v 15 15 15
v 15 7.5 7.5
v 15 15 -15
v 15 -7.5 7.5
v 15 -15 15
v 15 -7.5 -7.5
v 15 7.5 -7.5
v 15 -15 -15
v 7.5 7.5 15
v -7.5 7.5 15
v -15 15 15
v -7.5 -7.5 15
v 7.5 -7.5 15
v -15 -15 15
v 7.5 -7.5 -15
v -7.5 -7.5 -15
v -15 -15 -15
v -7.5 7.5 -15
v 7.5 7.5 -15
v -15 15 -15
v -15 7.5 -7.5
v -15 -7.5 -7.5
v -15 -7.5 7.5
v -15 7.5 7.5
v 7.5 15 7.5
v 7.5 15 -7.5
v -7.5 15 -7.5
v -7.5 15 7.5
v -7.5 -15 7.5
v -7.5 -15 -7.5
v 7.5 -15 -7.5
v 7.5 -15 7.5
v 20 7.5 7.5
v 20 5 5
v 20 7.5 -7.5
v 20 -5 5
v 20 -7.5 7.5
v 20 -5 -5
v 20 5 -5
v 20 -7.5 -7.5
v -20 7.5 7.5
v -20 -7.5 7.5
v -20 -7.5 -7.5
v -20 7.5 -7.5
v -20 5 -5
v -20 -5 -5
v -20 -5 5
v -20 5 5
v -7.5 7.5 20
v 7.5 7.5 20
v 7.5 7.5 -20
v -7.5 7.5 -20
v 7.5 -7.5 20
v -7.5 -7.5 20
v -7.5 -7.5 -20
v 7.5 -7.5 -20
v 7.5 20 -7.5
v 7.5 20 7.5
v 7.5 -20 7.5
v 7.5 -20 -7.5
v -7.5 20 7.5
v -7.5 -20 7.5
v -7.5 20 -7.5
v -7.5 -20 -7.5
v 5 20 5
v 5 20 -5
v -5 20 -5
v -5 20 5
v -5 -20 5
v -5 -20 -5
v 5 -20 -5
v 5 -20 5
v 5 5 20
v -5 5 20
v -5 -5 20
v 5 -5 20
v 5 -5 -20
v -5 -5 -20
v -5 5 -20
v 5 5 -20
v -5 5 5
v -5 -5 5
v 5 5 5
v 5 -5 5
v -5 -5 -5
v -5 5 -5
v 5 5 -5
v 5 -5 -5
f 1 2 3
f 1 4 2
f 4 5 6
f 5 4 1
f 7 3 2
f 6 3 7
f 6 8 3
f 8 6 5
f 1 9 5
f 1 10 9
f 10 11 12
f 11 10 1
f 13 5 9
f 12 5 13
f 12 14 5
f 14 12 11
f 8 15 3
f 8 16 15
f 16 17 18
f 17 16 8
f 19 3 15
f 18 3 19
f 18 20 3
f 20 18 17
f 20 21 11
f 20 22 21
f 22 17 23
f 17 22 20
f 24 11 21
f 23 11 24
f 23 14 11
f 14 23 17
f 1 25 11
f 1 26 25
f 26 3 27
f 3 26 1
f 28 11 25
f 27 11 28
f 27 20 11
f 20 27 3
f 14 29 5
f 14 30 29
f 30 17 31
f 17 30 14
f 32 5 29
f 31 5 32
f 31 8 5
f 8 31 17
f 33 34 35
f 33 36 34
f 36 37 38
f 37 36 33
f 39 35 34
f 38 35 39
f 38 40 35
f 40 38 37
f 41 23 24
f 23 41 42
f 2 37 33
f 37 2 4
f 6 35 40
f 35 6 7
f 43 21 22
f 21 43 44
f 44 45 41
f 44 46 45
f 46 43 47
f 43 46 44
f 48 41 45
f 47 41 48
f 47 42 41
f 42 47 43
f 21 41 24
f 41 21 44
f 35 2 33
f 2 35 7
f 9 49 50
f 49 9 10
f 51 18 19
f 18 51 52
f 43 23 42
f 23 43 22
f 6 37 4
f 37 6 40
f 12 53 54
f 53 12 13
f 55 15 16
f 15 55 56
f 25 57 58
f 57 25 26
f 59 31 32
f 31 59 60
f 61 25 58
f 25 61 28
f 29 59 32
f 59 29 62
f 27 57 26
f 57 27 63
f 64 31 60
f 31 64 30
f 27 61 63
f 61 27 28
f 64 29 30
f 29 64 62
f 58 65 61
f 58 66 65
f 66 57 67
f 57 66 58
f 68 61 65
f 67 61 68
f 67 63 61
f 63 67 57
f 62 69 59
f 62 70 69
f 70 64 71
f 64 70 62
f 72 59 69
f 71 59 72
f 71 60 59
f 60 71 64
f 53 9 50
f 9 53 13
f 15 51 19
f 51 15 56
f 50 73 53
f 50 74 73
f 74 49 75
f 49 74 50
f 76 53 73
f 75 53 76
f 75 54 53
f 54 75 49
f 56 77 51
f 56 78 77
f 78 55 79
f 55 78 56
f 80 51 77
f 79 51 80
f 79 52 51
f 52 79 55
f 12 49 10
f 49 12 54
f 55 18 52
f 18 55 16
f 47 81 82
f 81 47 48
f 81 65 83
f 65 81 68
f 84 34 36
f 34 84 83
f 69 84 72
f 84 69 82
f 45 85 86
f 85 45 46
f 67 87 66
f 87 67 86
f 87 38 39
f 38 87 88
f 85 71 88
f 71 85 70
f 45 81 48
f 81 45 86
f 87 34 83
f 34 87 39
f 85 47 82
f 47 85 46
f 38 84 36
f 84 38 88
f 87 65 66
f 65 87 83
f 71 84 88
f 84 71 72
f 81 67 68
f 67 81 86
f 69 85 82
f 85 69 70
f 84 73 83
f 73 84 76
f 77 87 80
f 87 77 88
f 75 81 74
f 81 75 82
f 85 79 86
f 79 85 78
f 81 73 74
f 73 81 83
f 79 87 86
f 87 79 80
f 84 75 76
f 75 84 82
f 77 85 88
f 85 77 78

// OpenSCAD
difference(){union(){translate(v = [-15.0, -15.0, -15.0])
cube(size = [30, 30, 30]);
translate(v = [-20.0, -7.5, -7.5])
cube(size = [40, 15, 15]);
translate(v = [-7.5, -20.0, -7.5])
cube(size = [15, 40, 15]);
translate(v = [-7.5, -7.5, -20.0])
cube(size = [15, 15, 40]);
}
union(){translate(v = [-25.0, -5.0, -5.0])
cube(size = [50, 10, 10]);
translate(v = [-5.0, -25.0, -5.0])
cube(size = [10, 50, 10]);
translate(v = [-5.0, -5.0, -25.0])
cube(size = [10, 10, 50]);
}
}
